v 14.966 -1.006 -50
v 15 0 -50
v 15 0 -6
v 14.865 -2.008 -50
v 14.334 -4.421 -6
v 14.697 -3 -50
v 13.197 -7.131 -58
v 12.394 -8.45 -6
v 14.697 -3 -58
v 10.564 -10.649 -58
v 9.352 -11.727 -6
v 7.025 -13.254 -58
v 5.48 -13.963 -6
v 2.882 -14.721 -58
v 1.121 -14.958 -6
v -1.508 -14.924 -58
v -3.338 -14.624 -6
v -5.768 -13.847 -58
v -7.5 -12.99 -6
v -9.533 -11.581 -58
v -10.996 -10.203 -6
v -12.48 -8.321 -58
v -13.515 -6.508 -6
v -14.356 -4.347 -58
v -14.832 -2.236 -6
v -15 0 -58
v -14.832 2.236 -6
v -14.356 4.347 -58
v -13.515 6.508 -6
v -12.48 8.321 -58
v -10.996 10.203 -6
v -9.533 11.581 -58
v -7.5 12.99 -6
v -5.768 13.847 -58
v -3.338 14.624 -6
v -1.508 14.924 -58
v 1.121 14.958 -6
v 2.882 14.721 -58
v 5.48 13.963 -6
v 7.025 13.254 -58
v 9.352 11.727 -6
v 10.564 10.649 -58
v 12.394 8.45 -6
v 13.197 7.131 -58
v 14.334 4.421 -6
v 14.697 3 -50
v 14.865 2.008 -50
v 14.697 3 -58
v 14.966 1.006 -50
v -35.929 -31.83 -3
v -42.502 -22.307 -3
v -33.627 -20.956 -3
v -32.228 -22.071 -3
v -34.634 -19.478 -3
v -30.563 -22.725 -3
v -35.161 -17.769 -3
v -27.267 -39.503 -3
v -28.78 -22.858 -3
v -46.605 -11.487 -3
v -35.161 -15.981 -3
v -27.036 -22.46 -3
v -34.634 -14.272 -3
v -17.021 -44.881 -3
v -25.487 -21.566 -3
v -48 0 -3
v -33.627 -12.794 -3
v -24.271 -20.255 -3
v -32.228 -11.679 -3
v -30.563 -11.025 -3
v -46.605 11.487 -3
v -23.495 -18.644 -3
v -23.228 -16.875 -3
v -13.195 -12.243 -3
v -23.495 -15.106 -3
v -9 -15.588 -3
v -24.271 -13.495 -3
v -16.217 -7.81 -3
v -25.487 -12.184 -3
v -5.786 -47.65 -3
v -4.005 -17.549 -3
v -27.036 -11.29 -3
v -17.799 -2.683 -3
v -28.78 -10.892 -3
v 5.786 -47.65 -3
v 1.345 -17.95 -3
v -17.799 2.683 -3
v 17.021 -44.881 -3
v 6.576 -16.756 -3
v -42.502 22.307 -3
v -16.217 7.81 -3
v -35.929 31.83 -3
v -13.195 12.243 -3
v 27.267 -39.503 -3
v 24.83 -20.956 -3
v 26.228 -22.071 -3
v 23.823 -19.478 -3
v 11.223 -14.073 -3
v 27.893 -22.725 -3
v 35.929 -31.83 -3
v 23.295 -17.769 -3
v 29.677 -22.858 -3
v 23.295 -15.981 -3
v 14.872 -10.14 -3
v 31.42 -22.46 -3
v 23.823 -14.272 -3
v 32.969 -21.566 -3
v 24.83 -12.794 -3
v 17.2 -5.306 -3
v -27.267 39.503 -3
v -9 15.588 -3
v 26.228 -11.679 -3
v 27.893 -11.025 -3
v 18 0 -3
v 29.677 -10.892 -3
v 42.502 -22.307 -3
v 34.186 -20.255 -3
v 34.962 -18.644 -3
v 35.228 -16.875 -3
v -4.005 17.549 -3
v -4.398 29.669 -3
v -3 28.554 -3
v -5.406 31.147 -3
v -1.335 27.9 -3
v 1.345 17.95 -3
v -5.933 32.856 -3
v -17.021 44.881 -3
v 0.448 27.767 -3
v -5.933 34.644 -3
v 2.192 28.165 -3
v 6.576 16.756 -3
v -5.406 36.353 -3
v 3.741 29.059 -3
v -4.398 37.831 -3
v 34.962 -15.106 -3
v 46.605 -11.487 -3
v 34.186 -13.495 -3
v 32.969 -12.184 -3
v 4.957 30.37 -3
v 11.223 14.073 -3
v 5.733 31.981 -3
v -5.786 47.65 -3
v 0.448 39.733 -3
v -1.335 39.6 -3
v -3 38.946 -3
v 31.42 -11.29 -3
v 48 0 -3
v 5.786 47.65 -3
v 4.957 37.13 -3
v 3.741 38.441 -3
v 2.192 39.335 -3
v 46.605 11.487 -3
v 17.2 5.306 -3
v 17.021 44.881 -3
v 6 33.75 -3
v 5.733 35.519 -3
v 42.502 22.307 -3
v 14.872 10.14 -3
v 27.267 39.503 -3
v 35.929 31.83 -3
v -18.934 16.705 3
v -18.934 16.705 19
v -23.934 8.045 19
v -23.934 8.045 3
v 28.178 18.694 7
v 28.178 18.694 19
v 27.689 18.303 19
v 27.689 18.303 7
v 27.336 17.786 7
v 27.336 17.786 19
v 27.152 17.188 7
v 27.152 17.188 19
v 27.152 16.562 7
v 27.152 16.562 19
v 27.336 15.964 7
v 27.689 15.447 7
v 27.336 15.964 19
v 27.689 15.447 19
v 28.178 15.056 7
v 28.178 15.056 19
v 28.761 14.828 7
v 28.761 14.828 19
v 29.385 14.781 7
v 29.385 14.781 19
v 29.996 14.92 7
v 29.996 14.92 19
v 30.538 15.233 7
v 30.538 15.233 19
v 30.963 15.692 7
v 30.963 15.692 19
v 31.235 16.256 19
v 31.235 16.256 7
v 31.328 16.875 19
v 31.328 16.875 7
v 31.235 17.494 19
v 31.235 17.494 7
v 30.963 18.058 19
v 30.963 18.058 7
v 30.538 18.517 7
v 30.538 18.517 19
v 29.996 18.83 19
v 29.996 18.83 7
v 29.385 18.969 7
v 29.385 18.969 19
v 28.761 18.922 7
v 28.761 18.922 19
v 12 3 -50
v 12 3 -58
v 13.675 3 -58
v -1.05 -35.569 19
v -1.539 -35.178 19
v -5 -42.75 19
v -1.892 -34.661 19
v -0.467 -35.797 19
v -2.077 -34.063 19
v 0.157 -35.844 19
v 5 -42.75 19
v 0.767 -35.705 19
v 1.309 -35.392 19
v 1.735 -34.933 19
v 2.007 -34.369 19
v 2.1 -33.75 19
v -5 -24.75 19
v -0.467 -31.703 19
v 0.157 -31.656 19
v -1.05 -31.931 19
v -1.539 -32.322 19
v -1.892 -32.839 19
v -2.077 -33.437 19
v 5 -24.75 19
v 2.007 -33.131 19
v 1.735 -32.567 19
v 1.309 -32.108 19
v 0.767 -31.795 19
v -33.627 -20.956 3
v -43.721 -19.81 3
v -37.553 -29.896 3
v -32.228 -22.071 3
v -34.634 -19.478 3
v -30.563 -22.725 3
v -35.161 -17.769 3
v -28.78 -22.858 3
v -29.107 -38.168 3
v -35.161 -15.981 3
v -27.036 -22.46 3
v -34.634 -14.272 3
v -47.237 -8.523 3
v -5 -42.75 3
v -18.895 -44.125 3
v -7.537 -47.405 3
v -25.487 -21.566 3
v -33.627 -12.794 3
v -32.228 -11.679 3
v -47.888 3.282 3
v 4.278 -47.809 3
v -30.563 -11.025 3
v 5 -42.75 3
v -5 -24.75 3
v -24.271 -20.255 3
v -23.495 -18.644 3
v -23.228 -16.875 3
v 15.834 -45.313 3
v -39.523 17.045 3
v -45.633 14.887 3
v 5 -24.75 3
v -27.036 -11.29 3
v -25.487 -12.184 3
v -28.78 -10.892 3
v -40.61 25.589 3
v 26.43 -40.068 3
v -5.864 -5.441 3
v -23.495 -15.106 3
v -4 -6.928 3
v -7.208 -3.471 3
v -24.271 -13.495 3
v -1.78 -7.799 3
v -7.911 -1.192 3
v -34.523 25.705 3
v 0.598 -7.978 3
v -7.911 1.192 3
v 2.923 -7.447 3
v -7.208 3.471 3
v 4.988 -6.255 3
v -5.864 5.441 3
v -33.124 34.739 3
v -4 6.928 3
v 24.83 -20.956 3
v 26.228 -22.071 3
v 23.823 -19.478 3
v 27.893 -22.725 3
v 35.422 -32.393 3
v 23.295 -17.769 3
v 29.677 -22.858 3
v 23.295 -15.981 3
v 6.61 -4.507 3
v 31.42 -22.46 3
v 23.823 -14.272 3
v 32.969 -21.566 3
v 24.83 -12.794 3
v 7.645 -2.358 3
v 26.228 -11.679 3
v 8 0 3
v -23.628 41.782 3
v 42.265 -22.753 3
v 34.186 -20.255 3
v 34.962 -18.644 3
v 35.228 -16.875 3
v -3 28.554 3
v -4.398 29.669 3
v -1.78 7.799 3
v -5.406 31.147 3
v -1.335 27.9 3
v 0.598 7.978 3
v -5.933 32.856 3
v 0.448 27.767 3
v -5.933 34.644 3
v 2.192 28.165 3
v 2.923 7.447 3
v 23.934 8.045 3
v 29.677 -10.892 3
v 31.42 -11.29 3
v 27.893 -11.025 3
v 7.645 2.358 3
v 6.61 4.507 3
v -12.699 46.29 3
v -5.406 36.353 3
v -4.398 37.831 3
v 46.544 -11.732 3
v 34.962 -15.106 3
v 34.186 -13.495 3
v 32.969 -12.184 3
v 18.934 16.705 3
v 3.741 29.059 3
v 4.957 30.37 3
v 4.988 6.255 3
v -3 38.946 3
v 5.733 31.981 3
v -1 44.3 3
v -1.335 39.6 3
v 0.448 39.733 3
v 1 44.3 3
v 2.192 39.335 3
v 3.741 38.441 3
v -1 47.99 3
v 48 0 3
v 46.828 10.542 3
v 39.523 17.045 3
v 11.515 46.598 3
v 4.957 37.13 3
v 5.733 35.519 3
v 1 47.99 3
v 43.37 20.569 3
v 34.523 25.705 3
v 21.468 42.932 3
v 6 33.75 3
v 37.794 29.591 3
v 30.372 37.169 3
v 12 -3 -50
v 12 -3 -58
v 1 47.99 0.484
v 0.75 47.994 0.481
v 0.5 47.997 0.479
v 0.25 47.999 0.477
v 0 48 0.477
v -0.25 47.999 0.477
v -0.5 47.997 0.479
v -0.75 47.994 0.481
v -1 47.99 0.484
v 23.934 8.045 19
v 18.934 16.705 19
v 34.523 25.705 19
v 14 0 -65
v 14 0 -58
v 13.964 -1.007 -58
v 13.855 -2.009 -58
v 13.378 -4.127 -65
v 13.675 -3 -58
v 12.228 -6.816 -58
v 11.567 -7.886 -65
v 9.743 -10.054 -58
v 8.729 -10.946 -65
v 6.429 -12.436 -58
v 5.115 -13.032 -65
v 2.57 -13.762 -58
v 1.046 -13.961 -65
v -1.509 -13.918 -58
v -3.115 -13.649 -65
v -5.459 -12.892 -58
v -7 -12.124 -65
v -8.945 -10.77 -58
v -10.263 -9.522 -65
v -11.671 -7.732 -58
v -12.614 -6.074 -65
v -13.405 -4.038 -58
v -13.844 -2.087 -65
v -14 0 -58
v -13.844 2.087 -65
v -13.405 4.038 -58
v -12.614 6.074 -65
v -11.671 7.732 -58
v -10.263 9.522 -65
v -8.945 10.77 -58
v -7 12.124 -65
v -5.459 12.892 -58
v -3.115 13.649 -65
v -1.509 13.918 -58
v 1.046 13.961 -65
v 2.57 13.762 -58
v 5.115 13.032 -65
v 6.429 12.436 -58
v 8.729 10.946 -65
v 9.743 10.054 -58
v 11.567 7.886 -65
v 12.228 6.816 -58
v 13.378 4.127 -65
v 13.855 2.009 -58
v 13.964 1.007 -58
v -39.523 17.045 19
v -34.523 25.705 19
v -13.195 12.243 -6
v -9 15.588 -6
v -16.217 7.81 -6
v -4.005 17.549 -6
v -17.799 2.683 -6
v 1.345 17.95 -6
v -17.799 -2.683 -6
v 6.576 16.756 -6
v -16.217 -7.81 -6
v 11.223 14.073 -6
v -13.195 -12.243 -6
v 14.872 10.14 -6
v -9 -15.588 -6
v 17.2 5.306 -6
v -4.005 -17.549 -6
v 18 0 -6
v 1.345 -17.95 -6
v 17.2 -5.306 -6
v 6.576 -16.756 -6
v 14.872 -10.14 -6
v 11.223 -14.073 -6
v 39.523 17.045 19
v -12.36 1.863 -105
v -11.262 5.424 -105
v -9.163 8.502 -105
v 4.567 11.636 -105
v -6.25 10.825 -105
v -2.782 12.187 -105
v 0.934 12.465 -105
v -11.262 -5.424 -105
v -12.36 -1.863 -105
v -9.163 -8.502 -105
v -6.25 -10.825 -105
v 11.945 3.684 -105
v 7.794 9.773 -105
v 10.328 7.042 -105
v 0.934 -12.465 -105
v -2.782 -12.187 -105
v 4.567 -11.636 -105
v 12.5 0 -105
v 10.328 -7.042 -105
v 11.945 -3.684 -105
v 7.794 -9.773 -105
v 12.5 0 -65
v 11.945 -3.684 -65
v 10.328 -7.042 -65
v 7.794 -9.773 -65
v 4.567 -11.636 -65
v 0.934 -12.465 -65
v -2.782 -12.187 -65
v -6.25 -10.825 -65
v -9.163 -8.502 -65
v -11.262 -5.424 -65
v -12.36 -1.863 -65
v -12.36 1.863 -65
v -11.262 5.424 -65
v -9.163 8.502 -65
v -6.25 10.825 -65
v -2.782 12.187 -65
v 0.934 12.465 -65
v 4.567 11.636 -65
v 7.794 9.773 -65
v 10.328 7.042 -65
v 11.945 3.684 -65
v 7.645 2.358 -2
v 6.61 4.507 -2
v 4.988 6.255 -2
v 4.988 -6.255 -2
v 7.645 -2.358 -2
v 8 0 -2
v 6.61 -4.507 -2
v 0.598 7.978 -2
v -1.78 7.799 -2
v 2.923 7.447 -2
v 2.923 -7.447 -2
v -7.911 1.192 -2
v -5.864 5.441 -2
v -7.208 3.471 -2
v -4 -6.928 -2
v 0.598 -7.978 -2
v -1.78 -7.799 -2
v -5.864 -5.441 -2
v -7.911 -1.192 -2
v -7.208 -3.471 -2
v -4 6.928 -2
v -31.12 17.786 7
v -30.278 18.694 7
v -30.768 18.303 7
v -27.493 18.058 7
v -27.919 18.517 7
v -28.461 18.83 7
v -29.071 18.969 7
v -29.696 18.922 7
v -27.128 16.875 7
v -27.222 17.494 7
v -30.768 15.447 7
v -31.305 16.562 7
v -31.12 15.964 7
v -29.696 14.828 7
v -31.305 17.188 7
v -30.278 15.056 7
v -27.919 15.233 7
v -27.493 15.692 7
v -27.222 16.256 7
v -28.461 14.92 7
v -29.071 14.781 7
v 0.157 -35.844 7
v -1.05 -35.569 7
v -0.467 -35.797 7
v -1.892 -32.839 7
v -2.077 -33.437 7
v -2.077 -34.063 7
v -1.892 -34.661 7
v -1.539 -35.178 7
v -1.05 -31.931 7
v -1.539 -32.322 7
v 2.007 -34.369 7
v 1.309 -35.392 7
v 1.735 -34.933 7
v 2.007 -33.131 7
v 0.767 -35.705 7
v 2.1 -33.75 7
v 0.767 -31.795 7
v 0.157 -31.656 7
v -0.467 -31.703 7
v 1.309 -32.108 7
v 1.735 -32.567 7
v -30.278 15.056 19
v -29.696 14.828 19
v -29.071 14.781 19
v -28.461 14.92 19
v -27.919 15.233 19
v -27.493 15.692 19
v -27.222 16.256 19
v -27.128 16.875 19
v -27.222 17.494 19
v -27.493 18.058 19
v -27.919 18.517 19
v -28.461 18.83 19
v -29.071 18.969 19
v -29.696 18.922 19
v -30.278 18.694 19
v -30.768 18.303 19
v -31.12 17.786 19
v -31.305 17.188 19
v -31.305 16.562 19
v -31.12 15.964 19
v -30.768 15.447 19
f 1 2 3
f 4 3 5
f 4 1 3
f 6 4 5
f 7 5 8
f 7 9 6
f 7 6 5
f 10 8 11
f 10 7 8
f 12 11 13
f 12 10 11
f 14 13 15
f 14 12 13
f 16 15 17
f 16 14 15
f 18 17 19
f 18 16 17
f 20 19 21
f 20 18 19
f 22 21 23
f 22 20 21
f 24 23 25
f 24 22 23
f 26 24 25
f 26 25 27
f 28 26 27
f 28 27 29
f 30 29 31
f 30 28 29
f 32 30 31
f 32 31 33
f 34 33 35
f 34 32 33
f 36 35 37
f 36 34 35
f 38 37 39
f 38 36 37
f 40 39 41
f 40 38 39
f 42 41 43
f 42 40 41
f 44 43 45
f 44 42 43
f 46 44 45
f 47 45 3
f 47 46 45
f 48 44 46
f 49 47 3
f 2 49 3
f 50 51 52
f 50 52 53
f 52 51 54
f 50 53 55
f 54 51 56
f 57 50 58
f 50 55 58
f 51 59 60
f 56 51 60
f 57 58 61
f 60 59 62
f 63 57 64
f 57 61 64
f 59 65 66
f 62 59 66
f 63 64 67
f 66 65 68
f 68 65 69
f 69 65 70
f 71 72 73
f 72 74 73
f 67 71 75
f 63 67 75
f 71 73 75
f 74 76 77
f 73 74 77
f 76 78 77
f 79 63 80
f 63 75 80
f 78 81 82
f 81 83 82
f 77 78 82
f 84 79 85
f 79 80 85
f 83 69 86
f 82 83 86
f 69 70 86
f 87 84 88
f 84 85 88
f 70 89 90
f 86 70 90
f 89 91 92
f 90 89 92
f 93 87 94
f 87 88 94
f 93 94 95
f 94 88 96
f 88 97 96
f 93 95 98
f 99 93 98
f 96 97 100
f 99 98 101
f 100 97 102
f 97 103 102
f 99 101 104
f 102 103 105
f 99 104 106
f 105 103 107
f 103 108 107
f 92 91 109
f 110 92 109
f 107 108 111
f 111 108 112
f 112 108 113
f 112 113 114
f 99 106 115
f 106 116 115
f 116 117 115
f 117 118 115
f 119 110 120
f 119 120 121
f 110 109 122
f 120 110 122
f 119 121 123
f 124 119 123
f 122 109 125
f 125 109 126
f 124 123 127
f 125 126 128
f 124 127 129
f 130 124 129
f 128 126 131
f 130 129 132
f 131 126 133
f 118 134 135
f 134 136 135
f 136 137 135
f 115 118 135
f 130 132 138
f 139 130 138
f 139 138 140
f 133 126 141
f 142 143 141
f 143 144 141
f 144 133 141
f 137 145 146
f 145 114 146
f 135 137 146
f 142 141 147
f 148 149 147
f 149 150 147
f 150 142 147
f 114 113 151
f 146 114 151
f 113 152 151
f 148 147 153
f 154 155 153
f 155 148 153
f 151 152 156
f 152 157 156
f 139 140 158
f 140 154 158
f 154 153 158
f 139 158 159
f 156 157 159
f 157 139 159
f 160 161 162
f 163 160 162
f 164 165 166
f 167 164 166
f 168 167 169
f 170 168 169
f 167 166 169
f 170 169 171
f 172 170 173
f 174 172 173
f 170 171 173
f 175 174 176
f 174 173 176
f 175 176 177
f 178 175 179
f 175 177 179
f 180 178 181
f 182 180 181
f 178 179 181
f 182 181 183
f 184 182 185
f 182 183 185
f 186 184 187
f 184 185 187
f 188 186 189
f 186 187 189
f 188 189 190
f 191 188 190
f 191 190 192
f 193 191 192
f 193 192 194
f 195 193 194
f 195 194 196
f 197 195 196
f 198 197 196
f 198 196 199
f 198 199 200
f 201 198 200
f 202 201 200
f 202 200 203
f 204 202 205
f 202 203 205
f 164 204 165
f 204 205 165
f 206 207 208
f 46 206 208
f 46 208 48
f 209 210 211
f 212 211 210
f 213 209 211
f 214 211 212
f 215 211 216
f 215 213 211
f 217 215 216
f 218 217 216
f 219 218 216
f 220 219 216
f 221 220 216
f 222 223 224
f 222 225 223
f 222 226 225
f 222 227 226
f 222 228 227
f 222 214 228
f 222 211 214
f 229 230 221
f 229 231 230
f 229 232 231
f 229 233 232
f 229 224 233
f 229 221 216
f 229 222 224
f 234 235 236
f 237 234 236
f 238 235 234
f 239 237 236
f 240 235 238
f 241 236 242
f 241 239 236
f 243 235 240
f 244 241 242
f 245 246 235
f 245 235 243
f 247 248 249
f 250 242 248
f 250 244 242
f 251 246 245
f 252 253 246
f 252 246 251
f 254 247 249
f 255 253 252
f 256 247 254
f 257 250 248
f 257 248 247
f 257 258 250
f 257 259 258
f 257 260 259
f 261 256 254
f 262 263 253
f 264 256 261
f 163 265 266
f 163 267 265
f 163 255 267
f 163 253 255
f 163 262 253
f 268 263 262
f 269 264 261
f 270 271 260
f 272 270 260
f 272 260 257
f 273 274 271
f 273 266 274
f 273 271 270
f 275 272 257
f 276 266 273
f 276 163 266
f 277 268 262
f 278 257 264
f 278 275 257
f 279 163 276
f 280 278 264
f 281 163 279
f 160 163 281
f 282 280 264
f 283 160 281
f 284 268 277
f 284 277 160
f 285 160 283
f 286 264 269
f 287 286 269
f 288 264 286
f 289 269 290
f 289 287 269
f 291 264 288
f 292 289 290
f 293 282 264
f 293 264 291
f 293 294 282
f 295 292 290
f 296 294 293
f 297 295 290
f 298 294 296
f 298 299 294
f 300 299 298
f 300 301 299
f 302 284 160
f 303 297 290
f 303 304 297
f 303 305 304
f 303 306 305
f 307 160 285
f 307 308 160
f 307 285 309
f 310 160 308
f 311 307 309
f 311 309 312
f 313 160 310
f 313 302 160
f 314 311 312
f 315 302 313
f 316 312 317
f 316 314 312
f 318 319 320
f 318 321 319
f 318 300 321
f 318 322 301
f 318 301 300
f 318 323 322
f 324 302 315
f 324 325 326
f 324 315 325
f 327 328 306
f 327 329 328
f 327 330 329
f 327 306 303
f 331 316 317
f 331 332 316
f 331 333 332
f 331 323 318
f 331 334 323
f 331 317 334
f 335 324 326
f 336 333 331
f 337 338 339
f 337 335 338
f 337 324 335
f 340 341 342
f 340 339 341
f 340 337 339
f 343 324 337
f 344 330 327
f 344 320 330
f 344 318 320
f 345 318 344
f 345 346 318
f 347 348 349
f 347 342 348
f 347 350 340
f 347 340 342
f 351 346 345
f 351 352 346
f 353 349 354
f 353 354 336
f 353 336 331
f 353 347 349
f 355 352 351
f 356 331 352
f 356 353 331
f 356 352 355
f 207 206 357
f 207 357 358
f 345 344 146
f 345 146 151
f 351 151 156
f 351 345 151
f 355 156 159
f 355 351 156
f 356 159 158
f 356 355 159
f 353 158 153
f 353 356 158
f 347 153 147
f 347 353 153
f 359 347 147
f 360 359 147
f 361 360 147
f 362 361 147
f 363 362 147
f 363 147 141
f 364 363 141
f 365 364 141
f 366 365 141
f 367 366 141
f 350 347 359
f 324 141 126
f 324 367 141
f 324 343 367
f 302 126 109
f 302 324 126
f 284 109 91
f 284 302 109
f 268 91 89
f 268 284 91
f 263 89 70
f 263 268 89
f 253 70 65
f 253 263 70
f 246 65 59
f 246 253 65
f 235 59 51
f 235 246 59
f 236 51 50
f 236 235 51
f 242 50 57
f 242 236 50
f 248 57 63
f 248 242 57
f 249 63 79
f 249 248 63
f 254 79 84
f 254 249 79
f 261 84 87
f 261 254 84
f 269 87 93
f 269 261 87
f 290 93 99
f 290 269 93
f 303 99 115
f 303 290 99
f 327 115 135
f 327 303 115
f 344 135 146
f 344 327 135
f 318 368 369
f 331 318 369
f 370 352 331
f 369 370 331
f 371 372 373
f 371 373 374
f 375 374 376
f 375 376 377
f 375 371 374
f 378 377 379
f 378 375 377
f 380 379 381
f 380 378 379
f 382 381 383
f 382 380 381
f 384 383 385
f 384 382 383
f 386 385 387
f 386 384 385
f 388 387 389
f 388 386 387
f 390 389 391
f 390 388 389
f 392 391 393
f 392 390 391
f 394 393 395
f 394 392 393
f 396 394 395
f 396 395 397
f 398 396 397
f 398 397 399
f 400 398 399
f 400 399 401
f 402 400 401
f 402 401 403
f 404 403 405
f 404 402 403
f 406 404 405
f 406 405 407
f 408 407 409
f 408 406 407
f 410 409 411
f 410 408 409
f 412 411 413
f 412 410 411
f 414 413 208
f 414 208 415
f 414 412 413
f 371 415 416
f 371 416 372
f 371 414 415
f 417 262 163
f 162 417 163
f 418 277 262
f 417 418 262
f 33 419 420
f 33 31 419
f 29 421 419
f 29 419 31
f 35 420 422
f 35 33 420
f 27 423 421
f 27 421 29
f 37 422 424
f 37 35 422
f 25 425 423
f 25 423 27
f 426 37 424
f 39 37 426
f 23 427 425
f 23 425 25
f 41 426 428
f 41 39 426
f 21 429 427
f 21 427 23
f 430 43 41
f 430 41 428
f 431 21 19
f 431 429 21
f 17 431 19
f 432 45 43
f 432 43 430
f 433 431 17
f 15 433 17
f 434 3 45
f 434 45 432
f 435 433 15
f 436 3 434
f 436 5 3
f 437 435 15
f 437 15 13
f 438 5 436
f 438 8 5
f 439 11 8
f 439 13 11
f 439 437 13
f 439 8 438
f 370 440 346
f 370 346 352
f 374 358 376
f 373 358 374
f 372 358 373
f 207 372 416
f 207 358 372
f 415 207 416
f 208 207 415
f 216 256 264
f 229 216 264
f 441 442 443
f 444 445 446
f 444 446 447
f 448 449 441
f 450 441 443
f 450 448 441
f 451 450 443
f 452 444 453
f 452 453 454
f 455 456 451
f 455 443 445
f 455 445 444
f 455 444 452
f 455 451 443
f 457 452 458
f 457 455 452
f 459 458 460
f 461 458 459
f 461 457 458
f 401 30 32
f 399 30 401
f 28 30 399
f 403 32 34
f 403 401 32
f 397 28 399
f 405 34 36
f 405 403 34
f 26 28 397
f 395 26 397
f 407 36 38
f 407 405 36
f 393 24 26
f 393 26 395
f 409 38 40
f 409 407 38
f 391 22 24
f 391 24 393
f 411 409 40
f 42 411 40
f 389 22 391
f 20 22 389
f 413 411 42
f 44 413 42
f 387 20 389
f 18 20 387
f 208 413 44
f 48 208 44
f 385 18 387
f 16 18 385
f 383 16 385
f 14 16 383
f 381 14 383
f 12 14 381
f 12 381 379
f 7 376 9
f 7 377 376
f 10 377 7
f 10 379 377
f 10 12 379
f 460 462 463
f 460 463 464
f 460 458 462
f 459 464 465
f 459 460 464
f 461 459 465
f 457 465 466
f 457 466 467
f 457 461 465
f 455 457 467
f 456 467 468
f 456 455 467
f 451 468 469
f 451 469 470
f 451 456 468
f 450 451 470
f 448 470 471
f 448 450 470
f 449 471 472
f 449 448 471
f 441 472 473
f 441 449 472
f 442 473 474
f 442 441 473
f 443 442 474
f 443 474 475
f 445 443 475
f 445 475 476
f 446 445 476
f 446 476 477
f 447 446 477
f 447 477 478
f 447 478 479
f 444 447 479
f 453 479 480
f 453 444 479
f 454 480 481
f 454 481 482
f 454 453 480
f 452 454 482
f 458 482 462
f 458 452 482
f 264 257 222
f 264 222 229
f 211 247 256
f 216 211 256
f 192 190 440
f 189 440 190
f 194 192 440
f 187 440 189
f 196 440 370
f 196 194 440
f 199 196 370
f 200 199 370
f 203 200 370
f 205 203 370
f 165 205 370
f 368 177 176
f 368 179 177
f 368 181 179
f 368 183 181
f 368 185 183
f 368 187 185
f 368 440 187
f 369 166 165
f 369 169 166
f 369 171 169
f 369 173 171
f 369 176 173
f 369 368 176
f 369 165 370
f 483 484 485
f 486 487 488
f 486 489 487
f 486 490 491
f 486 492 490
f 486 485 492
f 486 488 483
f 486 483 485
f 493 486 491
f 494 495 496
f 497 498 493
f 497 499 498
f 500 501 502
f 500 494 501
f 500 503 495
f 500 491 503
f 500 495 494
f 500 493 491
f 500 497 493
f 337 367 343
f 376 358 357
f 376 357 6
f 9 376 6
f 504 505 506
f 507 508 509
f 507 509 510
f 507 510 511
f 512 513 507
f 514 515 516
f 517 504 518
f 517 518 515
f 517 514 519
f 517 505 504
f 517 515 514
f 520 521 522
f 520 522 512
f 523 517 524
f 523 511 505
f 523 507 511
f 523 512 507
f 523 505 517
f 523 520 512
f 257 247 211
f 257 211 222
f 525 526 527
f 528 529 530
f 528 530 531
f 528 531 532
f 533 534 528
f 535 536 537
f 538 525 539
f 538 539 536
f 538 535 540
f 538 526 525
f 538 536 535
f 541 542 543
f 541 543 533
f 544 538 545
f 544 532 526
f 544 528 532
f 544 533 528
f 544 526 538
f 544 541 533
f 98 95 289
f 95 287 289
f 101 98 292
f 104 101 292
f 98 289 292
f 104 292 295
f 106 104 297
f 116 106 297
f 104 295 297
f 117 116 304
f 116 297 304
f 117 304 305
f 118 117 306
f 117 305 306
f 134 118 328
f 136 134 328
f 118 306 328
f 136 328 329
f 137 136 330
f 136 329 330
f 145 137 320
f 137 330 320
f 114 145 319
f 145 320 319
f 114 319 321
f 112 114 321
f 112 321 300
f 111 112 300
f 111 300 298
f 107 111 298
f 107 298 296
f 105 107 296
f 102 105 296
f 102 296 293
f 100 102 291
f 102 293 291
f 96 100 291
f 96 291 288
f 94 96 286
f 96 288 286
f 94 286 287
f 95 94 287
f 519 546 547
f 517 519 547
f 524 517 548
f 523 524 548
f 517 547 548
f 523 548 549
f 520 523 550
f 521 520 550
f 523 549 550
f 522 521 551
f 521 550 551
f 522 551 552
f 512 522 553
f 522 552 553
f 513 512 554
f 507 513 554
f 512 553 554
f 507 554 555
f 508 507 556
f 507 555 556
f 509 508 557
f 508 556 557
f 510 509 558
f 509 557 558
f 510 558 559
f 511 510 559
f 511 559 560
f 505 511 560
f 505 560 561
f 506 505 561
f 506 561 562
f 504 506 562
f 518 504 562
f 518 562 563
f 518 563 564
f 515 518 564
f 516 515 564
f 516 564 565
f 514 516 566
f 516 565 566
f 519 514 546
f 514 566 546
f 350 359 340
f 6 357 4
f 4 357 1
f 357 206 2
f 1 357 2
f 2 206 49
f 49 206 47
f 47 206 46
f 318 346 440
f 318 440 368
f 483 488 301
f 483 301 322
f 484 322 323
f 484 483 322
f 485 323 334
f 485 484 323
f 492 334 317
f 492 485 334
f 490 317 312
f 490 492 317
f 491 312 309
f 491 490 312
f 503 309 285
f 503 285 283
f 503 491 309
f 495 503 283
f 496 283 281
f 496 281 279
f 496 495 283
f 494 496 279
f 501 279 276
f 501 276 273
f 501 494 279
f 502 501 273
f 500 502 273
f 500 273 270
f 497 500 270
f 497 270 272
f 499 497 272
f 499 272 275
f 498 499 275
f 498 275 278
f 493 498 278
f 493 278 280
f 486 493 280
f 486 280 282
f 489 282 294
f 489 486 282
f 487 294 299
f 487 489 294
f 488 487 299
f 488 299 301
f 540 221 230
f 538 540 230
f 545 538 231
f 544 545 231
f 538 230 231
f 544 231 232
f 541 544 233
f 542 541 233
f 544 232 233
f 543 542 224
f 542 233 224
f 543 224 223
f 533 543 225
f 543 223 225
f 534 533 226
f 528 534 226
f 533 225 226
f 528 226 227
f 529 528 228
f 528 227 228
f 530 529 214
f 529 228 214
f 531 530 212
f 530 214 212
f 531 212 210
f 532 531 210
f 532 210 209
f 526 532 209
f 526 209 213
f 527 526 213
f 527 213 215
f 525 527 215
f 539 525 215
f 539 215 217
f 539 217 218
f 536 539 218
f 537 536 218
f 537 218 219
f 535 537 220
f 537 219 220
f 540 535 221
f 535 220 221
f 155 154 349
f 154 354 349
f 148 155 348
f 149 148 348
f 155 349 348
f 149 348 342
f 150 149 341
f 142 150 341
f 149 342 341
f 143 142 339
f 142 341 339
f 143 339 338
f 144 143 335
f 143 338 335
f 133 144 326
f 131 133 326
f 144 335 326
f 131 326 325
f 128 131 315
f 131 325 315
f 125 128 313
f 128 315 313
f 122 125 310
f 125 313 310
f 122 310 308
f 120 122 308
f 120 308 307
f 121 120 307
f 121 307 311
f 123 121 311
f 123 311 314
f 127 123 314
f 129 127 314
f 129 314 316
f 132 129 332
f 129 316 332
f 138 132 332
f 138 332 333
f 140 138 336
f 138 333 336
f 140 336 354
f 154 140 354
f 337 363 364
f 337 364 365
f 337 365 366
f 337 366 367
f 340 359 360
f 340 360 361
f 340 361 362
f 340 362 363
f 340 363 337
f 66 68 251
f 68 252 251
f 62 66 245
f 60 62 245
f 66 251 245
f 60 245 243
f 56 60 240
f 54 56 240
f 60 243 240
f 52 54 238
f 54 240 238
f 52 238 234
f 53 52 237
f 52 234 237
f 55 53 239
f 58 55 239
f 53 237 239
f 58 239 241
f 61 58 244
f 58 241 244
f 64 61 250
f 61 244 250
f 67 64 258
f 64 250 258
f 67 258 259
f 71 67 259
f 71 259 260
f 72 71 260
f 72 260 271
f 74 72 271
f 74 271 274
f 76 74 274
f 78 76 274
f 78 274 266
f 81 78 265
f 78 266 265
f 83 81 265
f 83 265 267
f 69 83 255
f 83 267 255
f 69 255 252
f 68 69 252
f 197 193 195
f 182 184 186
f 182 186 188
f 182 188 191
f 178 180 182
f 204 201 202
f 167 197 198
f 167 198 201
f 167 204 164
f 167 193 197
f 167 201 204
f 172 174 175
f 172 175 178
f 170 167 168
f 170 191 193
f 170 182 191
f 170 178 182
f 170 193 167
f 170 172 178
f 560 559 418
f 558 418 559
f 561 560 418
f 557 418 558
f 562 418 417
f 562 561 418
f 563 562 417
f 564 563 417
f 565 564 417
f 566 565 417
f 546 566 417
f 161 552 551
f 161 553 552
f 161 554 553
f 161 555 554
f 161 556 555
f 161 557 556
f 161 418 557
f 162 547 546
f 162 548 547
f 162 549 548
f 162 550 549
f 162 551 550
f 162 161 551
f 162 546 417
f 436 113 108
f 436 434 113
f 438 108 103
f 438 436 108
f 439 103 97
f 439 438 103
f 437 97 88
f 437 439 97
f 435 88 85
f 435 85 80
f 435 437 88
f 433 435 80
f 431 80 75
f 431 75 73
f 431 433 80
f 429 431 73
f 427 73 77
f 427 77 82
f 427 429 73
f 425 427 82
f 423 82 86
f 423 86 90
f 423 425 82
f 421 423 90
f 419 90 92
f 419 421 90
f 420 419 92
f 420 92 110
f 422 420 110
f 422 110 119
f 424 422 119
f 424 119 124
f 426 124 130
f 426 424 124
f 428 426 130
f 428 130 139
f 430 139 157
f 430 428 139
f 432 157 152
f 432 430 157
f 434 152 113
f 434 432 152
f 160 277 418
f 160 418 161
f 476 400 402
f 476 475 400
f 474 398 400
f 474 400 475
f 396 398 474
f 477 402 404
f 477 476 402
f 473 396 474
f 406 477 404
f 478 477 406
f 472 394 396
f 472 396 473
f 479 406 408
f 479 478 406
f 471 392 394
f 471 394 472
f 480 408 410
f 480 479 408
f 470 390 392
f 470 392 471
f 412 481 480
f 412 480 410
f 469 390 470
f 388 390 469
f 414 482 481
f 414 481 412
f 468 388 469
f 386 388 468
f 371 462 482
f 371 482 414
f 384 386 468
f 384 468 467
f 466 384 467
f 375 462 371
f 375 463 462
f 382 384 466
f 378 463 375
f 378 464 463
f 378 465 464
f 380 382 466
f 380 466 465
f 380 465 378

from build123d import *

# Parameters (mm, degrees)
SKETCH1_R                        = 48
SKETCH1_R_2                      = 8
EX_CARRIER_FRONT_PLATE_4MM_DEPTH = 3
SKETCH2_R                        = 6
CUT_PIN_HOLE_12_DEPTH            = 69.14690015
PAT_PIN_HOLES_3X120_COUNT        = 3
CUT_EXTRUDE1_DEPTH               = 1
SKETCH4_W                        = 10
SKETCH4_H                        = 18
BOSS_EXTRUDE1_DEPTH              = 19
SKETCH5_R                        = 2.1
CUT_EXTRUDE3_DEPTH               = 12
CIRPATTERN1_COUNT                = 3
CIRPATTERN2_COUNT                = 3
SKETCH7_W                        = 4.5
SKETCH7_H                        = 8
CUT_MB6_TAB_GROOVE_6W_M27_DEPTH  = 3


with BuildPart() as part:
    # Sketch1 → EX_Carrier_Front_Plate_4mm (new, symmetric)
    with BuildSketch(Plane.XY):
        Circle(SKETCH1_R)
        Circle(SKETCH1_R_2, mode=Mode.SUBTRACT)
    extrude(amount=EX_CARRIER_FRONT_PLATE_4MM_DEPTH, both=True)

    # Sketch2 → CUT_Pin_Hole_Ø12 (cut, symmetric)
    with BuildSketch(Plane.XY.offset(3)):
        with Locations((0, 33.75)):
            Circle(SKETCH2_R)
    cut_pin_hole_12 = extrude(amount=CUT_PIN_HOLE_12_DEPTH, both=True, mode=Mode.SUBTRACT)

    # PAT_Pin_Holes_3x120: CUT_Pin_Hole_Ø12 ×3 about axis
    pat_pin_holes_3x120_axis = Axis((0, 0, 3), (0, 0, 1))
    for i in range(1, PAT_PIN_HOLES_3X120_COUNT):
        add(cut_pin_hole_12.rotate(pat_pin_holes_3x120_axis, i * 360 / PAT_PIN_HOLES_3X120_COUNT), mode=Mode.SUBTRACT)

    # Sketch3 → Cut-Extrude1 (cut, symmetric)
    with BuildSketch(Plane(origin=(0, 0, 0), x_dir=(0, 0, -1), z_dir=(1, 0, 0))):
        Polygon((-0.476916813, 48), (-3, 44.300014389), (-3, 48), align=None)
    extrude(amount=CUT_EXTRUDE1_DEPTH, both=True, mode=Mode.SUBTRACT)

    # Sketch4 → Boss-Extrude1 (add)
    with BuildSketch(Plane.XY):
        with Locations((0, -33.75)):
            Rectangle(SKETCH4_W, SKETCH4_H)
    boss_extrude1 = extrude(amount=BOSS_EXTRUDE1_DEPTH)

    # Sketch5 → Cut-Extrude3 (cut)
    with BuildSketch(Plane.XY.offset(19)):
        with Locations((0, -33.75)):
            Circle(SKETCH5_R)
    cut_extrude3 = extrude(amount=-CUT_EXTRUDE3_DEPTH, mode=Mode.SUBTRACT)

    # CirPattern1: Boss-Extrude1 ×3 about axis
    cirpattern1_axis = Axis((0, 0, -3.308265016), (0, 0, 1))
    for i in range(1, CIRPATTERN1_COUNT):
        add(boss_extrude1.rotate(cirpattern1_axis, i * 360 / CIRPATTERN1_COUNT))

    # CirPattern2: Cut-Extrude3 ×3 about axis
    cirpattern2_axis = Axis((0, 0, -3.308265016), (0, 0, 1))
    for i in range(1, CIRPATTERN2_COUNT):
        add(cut_extrude3.rotate(cirpattern2_axis, i * 360 / CIRPATTERN2_COUNT), mode=Mode.SUBTRACT)

    # Sketch6 → Revolve1 (revolve)
    with BuildSketch(Plane(origin=(0, 0, 0), x_dir=(0, 0, -1), z_dir=(1, 0, 0))):
        Polygon((2, 0), (2, 18), (6, 18), (6, 15), (58, 15), (58, 14), (65, 14), (65, 12.5), (105, 12.5), (105, 0), align=None)
    revolve(axis=Axis((0, 0, 4), (0, 0, -1)))

    # Sketch7 → CUT_MB6_Tab_Groove_6w_M27 (cut, symmetric)
    with BuildSketch(Plane(origin=(0, 0, 0), x_dir=(1, 0, 0), z_dir=(0, 1, 0))):
        with Locations((14.25, 54)):
            Rectangle(SKETCH7_W, SKETCH7_H)
    extrude(amount=CUT_MB6_TAB_GROOVE_6W_M27_DEPTH, both=True, mode=Mode.SUBTRACT)


solid = part.part
